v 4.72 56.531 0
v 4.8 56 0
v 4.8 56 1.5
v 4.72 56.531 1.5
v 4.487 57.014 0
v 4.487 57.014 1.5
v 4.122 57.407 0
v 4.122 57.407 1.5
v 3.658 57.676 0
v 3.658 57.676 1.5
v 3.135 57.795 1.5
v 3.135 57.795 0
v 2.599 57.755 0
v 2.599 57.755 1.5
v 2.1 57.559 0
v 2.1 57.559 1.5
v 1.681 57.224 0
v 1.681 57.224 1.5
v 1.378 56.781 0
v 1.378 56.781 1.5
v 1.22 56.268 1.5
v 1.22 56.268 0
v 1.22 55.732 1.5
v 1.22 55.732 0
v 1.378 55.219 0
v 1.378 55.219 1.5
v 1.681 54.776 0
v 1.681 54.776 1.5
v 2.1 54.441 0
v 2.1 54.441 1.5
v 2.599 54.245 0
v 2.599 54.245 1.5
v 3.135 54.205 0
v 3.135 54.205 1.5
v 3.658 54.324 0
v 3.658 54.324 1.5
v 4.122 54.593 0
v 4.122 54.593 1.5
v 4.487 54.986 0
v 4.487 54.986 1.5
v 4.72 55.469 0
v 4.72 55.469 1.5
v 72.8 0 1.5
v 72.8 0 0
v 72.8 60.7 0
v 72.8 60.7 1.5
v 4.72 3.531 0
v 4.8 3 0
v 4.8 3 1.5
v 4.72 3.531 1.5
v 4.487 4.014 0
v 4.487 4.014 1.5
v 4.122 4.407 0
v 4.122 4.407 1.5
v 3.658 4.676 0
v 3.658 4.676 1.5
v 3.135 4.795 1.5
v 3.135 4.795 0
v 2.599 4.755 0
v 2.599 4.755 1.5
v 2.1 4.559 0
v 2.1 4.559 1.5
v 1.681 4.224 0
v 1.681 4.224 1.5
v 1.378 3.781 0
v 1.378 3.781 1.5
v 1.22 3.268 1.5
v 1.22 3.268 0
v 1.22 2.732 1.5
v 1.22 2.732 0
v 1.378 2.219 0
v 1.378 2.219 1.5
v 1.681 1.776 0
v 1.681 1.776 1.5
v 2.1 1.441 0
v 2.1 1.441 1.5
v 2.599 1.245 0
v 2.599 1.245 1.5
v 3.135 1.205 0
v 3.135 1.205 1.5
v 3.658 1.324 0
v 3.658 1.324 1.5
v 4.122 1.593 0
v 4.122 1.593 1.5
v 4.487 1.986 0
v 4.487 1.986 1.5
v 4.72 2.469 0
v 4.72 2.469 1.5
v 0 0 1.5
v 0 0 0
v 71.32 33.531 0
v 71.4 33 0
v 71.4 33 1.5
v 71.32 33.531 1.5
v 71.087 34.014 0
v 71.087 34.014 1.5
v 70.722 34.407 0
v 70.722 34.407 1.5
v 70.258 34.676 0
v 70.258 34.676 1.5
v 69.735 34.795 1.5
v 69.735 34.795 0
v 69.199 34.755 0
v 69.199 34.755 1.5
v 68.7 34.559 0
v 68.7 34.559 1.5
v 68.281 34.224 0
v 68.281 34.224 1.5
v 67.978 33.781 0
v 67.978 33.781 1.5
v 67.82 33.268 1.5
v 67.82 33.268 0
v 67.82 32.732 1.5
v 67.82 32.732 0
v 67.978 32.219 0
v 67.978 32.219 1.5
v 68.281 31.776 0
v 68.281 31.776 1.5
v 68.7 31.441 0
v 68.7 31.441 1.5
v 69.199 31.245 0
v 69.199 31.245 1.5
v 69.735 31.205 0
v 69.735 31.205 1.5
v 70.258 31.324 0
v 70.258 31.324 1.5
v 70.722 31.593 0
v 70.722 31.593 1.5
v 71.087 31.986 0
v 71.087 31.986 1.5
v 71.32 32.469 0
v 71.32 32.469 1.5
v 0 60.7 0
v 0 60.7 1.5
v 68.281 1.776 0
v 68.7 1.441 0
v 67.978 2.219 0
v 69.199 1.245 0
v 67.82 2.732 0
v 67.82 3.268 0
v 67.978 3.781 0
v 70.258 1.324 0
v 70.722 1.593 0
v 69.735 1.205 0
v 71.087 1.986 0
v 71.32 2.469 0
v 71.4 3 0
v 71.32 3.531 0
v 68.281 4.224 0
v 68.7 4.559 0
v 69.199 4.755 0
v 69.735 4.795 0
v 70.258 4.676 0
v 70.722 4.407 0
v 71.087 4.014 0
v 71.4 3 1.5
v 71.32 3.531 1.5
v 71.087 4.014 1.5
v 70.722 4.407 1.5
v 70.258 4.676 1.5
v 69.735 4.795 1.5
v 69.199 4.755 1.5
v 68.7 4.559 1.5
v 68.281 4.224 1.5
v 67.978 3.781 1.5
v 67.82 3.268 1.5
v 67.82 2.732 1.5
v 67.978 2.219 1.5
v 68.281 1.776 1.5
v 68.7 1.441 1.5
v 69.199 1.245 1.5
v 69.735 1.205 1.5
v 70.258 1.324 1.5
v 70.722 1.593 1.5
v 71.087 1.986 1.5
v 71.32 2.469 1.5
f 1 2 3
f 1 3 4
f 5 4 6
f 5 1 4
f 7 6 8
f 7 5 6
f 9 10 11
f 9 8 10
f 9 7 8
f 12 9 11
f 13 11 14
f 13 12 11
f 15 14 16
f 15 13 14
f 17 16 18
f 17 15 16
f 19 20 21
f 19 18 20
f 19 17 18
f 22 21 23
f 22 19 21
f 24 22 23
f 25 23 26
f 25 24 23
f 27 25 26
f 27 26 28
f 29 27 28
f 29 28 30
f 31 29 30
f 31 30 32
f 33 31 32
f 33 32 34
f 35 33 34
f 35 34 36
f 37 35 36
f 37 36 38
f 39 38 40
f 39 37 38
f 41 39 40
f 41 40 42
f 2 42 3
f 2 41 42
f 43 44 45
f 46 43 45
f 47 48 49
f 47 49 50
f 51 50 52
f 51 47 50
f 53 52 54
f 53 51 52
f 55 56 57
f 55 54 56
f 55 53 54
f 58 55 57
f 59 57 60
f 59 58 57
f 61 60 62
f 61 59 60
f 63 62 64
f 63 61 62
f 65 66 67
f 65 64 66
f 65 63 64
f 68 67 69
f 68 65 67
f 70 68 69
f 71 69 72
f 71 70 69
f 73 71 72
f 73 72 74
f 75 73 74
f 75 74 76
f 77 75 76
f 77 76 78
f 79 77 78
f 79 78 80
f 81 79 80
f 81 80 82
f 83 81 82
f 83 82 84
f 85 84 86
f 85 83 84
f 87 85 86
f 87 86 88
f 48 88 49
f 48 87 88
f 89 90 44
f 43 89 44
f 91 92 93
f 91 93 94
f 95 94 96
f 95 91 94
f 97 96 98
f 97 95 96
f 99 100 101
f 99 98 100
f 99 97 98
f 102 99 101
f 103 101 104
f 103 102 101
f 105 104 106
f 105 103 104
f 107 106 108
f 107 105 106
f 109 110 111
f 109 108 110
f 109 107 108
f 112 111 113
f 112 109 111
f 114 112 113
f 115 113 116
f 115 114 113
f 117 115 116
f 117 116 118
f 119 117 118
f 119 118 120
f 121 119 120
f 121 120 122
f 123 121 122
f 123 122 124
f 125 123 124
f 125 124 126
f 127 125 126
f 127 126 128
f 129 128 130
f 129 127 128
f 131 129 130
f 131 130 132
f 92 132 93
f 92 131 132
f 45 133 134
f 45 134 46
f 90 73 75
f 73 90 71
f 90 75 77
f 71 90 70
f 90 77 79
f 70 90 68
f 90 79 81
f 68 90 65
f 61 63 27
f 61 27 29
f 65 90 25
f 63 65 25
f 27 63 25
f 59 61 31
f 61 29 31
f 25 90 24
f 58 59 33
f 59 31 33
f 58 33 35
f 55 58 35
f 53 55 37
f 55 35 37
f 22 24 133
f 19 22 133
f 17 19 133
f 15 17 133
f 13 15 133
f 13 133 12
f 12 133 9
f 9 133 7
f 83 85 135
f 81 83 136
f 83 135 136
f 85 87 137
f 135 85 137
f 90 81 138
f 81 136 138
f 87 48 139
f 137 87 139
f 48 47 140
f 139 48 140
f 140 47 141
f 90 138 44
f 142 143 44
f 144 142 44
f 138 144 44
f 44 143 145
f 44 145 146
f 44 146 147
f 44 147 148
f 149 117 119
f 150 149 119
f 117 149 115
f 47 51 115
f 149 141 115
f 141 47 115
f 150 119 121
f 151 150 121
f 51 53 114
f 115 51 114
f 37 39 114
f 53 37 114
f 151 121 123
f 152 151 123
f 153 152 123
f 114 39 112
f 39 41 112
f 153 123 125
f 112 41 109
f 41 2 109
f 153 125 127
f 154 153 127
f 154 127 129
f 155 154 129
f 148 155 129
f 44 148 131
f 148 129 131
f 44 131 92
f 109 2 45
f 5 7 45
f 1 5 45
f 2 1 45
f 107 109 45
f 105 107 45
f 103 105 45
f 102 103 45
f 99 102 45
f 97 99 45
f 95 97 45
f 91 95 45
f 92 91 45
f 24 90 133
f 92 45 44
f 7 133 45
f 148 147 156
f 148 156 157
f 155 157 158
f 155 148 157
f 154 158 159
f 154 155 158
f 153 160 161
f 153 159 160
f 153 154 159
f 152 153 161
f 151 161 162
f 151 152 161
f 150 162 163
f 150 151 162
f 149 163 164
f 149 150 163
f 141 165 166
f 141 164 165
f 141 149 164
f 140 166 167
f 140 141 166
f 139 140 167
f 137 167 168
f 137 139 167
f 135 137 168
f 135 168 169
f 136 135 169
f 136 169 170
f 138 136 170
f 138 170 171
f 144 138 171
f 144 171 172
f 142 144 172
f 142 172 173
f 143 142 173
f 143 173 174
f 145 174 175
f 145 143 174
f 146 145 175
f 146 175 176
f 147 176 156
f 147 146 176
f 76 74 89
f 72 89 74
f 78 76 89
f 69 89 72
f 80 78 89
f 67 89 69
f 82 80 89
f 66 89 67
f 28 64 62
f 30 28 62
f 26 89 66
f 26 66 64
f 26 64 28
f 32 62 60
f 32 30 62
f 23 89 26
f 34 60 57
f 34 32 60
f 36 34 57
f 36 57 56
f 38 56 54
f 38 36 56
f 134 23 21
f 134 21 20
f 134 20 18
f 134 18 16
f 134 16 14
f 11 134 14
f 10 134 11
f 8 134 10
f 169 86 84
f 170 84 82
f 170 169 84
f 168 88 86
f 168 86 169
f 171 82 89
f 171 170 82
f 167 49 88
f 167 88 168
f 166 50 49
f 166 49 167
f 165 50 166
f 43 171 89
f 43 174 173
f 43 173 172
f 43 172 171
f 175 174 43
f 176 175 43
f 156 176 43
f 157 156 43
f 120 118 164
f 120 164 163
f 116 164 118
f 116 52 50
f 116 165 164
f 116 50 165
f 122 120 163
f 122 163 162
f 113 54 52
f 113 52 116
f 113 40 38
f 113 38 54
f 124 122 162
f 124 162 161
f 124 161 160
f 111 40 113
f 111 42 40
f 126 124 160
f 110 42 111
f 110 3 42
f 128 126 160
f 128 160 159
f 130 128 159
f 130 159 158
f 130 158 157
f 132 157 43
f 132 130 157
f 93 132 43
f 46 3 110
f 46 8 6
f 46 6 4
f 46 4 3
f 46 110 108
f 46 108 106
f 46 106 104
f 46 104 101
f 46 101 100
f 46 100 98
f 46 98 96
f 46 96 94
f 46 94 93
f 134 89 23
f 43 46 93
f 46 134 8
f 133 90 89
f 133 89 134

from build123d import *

# Parameters (mm, degrees)
CYLINDER006_R     = 1.8
CYLINDER006_DEPTH = 20
CYLINDER007_R     = 1.8
CYLINDER007_DEPTH = 20
CYLINDER008_R     = 1.8
CYLINDER008_DEPTH = 20
CYLINDER005_R     = 1.8
CYLINDER005_DEPTH = 20
BOX037_W          = 72.8
BOX037_H          = 60.7
BOX037_DEPTH      = 1.5


with BuildPart() as cylinder006:
    # Cylinder006 → Cylinder006 (new body)
    with BuildSketch(Plane(origin=(69.6, 3, 0), x_dir=(1, 0, 0), z_dir=(0, 0, 1))):
        Circle(CYLINDER006_R)
    extrude(amount=CYLINDER006_DEPTH)


with BuildPart() as cylinder007:
    # Cylinder007 → Cylinder007 (new body)
    with BuildSketch(Plane(origin=(3, 56, 0), x_dir=(1, 0, 0), z_dir=(0, 0, 1))):
        Circle(CYLINDER007_R)
    extrude(amount=CYLINDER007_DEPTH)


with BuildPart() as cylinder008:
    # Cylinder008 → Cylinder008 (new body)
    with BuildSketch(Plane(origin=(3, 3, 0), x_dir=(1, 0, 0), z_dir=(0, 0, 1))):
        Circle(CYLINDER008_R)
    extrude(amount=CYLINDER008_DEPTH)


with BuildPart() as fusion010:
    # Cylinder005 → Cylinder005 (new body)
    with BuildSketch(Plane(origin=(69.6, 33, 0), x_dir=(1, 0, 0), z_dir=(0, 0, 1))):
        Circle(CYLINDER005_R)
    extrude(amount=CYLINDER005_DEPTH)

    # Fusion010: union Cylinder006, Cylinder007, Cylinder008
    add(cylinder006.part)
    add(cylinder007.part)
    add(cylinder008.part)


with BuildPart() as fusion010_1:
    # Fusion010 placement: moved
    add(fusion010.part.moved(Location((0, 0, -10))))


with BuildPart() as cut004:
    # Box037 → Box037 (new body)
    with BuildSketch(Plane.XY):
        with Locations((36.4, 30.35)):
            Rectangle(BOX037_W, BOX037_H)
    extrude(amount=BOX037_DEPTH)

    # Cut004: cut Fusion010
    add(fusion010_1.part, mode=Mode.SUBTRACT)


solid = cut004.part
